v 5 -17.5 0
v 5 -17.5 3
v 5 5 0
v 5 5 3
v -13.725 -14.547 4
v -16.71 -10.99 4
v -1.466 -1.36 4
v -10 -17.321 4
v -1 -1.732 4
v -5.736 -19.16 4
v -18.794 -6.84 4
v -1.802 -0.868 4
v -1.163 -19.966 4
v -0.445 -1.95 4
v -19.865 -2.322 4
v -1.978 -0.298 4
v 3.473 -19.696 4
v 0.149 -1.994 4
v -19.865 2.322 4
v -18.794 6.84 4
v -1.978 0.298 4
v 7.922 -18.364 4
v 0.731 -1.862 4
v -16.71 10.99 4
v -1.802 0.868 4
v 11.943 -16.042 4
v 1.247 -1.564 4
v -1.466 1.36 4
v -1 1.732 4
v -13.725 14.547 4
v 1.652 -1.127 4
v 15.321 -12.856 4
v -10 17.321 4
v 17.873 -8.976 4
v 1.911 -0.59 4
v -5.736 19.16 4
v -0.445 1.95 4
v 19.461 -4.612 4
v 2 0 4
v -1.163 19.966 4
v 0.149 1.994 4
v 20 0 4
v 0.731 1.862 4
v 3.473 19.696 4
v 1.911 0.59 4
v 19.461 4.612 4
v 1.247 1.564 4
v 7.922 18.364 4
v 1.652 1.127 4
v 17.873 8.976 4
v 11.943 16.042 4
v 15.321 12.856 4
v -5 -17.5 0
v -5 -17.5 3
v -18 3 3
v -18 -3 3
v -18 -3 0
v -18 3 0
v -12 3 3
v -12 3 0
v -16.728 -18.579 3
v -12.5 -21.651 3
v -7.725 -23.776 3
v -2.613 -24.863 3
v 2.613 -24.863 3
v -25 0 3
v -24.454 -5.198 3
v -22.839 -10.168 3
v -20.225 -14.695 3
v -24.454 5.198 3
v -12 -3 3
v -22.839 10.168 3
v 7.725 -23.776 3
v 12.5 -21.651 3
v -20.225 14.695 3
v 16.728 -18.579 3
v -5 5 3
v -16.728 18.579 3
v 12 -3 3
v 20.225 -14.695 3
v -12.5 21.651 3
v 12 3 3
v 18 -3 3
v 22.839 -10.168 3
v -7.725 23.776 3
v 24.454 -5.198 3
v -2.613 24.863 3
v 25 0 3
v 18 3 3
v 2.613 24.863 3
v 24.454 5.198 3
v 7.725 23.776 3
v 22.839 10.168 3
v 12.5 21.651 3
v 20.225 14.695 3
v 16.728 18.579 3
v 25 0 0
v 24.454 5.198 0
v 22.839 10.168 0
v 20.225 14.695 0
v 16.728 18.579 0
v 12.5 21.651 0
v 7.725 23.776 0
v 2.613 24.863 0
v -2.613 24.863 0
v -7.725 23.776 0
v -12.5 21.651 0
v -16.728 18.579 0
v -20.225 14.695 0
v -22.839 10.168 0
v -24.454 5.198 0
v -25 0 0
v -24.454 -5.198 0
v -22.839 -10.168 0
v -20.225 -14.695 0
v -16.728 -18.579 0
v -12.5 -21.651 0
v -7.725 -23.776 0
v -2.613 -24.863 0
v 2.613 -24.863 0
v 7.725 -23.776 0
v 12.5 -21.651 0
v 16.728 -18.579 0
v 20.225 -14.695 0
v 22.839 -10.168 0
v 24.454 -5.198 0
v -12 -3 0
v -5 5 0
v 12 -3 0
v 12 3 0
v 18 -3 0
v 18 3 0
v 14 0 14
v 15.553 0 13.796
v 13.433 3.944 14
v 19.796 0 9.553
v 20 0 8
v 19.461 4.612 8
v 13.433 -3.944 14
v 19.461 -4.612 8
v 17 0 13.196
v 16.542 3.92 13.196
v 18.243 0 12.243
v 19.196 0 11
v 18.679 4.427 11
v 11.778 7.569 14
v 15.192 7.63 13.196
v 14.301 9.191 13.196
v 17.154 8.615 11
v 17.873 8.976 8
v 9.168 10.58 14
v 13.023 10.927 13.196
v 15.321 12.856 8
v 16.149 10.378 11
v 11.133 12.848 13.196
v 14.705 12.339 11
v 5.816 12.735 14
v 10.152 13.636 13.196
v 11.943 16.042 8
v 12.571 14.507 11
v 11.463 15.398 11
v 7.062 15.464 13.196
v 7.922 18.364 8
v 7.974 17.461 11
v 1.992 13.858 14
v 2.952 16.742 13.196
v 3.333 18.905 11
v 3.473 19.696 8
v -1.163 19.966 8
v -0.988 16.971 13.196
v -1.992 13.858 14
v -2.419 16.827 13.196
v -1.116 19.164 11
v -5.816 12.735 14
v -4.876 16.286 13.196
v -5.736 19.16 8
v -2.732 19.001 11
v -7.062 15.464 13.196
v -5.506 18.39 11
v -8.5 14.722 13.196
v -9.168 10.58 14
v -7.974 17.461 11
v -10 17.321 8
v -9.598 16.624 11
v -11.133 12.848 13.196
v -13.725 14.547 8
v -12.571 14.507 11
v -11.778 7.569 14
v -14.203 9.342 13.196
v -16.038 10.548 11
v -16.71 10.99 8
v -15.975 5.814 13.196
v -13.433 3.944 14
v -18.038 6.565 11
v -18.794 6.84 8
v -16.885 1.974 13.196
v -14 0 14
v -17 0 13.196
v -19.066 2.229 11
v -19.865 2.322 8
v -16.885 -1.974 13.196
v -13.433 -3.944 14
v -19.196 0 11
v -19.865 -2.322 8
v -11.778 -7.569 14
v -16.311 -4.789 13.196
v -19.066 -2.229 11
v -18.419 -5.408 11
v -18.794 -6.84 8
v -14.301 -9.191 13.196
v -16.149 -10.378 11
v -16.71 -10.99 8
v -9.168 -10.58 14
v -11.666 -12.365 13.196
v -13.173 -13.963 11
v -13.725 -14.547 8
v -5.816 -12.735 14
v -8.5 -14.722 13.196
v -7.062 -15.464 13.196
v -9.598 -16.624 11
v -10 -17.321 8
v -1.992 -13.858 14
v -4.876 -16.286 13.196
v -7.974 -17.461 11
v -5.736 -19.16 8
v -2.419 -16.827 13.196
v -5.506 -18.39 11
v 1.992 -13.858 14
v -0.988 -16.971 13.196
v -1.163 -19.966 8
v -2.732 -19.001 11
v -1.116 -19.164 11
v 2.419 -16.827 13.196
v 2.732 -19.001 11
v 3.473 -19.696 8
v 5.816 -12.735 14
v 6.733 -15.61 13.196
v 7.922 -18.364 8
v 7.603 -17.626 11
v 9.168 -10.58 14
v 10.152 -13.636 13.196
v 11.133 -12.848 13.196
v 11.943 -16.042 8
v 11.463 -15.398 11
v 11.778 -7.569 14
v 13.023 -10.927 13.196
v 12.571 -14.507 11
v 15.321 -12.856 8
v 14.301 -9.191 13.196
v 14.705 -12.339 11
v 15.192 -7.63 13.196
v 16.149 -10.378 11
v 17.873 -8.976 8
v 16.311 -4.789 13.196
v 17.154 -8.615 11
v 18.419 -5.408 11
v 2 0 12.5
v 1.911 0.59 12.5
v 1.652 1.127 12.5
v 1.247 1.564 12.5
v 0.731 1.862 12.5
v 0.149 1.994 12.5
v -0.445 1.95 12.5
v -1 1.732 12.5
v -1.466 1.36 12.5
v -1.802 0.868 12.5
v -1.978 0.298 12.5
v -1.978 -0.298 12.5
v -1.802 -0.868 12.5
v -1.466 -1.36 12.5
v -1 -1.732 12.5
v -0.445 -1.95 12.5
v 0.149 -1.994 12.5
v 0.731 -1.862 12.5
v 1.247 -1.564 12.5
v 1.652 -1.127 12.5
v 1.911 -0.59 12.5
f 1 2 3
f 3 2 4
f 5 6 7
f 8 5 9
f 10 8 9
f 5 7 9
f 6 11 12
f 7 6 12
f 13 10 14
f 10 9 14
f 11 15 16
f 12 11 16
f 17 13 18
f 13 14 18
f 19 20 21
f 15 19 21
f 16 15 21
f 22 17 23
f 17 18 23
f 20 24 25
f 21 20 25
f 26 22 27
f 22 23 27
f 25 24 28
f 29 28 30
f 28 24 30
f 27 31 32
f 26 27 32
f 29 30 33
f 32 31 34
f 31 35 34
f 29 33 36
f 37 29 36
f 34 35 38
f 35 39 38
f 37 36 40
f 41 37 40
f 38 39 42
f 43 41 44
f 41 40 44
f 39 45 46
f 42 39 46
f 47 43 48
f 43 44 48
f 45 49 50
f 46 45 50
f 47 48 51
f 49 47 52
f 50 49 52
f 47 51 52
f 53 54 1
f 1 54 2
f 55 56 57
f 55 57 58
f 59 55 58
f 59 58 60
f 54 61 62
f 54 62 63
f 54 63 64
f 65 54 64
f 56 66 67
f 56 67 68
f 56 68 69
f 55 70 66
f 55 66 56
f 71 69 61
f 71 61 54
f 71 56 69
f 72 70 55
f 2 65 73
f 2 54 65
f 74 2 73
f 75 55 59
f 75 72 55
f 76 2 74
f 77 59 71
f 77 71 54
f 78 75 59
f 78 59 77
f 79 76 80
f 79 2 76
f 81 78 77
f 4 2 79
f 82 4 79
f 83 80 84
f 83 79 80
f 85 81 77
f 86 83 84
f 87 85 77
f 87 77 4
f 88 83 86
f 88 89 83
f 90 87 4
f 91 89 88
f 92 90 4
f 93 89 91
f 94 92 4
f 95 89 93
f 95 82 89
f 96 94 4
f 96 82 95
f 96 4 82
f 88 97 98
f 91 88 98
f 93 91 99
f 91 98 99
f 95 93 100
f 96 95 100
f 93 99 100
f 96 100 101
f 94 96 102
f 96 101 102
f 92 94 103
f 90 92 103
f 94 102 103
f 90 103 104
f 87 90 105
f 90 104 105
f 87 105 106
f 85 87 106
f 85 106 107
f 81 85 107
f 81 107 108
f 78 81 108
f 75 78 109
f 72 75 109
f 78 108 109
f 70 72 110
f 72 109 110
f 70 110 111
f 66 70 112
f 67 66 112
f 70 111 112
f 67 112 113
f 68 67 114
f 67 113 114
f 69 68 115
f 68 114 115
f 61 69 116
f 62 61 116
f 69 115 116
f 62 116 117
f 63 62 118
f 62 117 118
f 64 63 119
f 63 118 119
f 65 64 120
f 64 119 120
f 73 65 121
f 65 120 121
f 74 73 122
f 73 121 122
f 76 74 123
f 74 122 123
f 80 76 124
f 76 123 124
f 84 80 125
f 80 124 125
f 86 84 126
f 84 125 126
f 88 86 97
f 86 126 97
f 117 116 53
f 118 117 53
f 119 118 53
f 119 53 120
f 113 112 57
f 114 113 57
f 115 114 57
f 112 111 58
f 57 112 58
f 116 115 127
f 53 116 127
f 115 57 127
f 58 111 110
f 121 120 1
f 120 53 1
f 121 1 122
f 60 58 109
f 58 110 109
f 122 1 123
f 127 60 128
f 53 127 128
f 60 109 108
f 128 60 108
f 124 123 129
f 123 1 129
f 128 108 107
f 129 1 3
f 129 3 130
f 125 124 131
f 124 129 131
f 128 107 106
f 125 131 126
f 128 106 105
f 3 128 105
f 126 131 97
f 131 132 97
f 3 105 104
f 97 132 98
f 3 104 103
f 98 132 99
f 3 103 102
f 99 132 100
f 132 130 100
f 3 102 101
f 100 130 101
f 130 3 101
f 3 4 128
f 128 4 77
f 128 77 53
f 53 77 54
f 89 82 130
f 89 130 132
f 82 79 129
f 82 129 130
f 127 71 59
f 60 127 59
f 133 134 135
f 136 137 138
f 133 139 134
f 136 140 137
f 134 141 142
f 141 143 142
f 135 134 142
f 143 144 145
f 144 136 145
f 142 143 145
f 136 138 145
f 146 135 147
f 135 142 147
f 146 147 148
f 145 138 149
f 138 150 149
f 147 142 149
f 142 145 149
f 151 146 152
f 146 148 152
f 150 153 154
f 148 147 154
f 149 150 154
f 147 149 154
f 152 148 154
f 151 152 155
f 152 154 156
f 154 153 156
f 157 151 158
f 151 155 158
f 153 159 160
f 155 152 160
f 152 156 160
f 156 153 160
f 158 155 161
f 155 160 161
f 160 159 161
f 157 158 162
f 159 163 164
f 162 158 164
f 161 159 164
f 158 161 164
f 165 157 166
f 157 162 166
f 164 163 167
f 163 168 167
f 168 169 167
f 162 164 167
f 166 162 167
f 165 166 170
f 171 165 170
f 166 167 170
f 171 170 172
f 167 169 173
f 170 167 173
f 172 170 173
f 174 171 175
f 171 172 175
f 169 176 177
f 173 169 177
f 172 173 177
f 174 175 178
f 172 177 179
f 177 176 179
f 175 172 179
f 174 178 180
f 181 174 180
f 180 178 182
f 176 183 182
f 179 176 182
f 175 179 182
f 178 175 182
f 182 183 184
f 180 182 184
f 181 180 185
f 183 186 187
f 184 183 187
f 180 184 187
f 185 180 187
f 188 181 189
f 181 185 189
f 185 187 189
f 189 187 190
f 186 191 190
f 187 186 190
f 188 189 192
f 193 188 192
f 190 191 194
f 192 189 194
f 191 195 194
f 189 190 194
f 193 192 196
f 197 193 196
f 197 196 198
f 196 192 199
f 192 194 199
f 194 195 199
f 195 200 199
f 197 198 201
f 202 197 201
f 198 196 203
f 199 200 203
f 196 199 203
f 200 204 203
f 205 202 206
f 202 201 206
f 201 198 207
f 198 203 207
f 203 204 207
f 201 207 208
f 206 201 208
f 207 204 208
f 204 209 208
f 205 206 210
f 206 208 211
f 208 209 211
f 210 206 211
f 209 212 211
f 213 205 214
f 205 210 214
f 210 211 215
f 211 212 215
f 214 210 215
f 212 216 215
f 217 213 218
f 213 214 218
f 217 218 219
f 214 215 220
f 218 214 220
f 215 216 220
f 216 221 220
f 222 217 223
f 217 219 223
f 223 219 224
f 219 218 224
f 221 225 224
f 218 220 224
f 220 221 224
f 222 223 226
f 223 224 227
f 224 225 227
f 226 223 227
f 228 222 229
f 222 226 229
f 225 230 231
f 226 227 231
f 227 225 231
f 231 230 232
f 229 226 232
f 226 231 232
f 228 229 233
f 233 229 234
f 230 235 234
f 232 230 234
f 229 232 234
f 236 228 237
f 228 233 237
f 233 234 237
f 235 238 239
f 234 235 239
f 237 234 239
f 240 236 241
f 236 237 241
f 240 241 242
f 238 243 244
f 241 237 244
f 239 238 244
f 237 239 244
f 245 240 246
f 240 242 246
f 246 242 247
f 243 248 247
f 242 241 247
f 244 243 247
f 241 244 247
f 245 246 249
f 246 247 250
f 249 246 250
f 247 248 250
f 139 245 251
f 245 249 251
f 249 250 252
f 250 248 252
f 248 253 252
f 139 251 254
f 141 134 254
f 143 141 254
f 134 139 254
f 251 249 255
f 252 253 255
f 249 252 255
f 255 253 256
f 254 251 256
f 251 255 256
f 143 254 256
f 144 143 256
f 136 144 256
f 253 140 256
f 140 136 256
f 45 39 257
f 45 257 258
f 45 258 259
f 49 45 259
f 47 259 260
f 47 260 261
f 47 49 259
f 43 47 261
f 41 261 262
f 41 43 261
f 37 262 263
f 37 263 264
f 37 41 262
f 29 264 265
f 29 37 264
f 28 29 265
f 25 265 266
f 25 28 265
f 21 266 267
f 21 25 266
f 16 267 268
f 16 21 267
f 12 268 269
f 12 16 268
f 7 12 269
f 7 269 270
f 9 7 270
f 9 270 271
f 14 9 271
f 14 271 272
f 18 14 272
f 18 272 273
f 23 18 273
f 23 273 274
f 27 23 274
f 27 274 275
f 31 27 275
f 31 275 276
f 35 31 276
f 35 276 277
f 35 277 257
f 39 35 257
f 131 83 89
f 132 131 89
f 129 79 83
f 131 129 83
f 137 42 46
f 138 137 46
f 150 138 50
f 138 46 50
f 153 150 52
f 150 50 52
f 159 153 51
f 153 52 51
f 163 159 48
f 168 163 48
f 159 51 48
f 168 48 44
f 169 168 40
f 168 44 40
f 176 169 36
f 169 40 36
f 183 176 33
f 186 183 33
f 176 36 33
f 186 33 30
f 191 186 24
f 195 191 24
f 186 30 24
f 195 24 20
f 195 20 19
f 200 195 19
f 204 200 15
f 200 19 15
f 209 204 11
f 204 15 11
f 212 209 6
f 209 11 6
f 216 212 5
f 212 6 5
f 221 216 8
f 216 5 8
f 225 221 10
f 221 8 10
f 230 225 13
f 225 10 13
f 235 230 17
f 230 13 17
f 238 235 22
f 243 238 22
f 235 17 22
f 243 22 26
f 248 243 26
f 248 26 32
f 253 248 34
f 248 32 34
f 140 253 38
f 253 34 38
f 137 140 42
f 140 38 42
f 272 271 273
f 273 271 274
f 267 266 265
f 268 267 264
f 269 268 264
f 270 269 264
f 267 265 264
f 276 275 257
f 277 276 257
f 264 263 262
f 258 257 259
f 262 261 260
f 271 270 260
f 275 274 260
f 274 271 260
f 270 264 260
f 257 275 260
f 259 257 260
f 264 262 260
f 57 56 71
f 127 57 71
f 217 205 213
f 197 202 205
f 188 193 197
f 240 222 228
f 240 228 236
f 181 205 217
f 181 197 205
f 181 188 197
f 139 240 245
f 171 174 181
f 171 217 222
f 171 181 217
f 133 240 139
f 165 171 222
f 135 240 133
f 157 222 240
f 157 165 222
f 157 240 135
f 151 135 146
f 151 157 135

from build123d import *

# Parameters (mm, degrees)
F0_R      = 25
F1_DEPTH  = 3
F3_DEPTH  = 25
F5_R      = 20
F5_R_2    = 2
F6_DEPTH  = 10
F7_R      = 2
F8_DEPTH  = 1.5
F9_R      = 6
F10_W     = 6
F10_H     = 6
F11_DEPTH = 25


with BuildPart() as f1:
    # F0 (on Top) → F1 (new body)
    with BuildSketch(Plane.XY):
        Circle(F0_R)
    extrude(amount=F1_DEPTH)

    # F2 (on face) → F3 (cut)
    with BuildSketch(Plane.XY.offset(3)):
        Polygon((-5, 0), (-5, -17.499997), (5, -17.499997), (5, 0), (5, 5), (-5, 5), align=None)
    extrude(amount=-F3_DEPTH, mode=Mode.SUBTRACT)

    # F10 (on face) → F11 (cut)
    with BuildSketch(Plane.XY.offset(3)):
        with Locations((-15, 0)):
            Rectangle(F10_W, F10_H)
        with Locations((15, 0)):
            Rectangle(F10_W, F10_H)
    extrude(amount=-F11_DEPTH, mode=Mode.SUBTRACT)


with BuildPart() as f6:
    # F5 (on offset) → F6 (new body)
    with BuildSketch(Plane.XY.offset(4)):
        Circle(F5_R)
        Circle(F5_R_2, mode=Mode.SUBTRACT)
    extrude(amount=F6_DEPTH)

    # F7 (on face) → F8 (join)
    with BuildSketch(Plane.XY.offset(14)):
        Circle(F7_R)
    extrude(amount=-F8_DEPTH)

    # F9
    f9_edges = [f6.edges().sort_by_distance(p)[0] for p in [
        (-20, 0, 14),
    ]]
    fillet(f9_edges, radius=F9_R)


solid = Compound([f1.part, f6.part])
